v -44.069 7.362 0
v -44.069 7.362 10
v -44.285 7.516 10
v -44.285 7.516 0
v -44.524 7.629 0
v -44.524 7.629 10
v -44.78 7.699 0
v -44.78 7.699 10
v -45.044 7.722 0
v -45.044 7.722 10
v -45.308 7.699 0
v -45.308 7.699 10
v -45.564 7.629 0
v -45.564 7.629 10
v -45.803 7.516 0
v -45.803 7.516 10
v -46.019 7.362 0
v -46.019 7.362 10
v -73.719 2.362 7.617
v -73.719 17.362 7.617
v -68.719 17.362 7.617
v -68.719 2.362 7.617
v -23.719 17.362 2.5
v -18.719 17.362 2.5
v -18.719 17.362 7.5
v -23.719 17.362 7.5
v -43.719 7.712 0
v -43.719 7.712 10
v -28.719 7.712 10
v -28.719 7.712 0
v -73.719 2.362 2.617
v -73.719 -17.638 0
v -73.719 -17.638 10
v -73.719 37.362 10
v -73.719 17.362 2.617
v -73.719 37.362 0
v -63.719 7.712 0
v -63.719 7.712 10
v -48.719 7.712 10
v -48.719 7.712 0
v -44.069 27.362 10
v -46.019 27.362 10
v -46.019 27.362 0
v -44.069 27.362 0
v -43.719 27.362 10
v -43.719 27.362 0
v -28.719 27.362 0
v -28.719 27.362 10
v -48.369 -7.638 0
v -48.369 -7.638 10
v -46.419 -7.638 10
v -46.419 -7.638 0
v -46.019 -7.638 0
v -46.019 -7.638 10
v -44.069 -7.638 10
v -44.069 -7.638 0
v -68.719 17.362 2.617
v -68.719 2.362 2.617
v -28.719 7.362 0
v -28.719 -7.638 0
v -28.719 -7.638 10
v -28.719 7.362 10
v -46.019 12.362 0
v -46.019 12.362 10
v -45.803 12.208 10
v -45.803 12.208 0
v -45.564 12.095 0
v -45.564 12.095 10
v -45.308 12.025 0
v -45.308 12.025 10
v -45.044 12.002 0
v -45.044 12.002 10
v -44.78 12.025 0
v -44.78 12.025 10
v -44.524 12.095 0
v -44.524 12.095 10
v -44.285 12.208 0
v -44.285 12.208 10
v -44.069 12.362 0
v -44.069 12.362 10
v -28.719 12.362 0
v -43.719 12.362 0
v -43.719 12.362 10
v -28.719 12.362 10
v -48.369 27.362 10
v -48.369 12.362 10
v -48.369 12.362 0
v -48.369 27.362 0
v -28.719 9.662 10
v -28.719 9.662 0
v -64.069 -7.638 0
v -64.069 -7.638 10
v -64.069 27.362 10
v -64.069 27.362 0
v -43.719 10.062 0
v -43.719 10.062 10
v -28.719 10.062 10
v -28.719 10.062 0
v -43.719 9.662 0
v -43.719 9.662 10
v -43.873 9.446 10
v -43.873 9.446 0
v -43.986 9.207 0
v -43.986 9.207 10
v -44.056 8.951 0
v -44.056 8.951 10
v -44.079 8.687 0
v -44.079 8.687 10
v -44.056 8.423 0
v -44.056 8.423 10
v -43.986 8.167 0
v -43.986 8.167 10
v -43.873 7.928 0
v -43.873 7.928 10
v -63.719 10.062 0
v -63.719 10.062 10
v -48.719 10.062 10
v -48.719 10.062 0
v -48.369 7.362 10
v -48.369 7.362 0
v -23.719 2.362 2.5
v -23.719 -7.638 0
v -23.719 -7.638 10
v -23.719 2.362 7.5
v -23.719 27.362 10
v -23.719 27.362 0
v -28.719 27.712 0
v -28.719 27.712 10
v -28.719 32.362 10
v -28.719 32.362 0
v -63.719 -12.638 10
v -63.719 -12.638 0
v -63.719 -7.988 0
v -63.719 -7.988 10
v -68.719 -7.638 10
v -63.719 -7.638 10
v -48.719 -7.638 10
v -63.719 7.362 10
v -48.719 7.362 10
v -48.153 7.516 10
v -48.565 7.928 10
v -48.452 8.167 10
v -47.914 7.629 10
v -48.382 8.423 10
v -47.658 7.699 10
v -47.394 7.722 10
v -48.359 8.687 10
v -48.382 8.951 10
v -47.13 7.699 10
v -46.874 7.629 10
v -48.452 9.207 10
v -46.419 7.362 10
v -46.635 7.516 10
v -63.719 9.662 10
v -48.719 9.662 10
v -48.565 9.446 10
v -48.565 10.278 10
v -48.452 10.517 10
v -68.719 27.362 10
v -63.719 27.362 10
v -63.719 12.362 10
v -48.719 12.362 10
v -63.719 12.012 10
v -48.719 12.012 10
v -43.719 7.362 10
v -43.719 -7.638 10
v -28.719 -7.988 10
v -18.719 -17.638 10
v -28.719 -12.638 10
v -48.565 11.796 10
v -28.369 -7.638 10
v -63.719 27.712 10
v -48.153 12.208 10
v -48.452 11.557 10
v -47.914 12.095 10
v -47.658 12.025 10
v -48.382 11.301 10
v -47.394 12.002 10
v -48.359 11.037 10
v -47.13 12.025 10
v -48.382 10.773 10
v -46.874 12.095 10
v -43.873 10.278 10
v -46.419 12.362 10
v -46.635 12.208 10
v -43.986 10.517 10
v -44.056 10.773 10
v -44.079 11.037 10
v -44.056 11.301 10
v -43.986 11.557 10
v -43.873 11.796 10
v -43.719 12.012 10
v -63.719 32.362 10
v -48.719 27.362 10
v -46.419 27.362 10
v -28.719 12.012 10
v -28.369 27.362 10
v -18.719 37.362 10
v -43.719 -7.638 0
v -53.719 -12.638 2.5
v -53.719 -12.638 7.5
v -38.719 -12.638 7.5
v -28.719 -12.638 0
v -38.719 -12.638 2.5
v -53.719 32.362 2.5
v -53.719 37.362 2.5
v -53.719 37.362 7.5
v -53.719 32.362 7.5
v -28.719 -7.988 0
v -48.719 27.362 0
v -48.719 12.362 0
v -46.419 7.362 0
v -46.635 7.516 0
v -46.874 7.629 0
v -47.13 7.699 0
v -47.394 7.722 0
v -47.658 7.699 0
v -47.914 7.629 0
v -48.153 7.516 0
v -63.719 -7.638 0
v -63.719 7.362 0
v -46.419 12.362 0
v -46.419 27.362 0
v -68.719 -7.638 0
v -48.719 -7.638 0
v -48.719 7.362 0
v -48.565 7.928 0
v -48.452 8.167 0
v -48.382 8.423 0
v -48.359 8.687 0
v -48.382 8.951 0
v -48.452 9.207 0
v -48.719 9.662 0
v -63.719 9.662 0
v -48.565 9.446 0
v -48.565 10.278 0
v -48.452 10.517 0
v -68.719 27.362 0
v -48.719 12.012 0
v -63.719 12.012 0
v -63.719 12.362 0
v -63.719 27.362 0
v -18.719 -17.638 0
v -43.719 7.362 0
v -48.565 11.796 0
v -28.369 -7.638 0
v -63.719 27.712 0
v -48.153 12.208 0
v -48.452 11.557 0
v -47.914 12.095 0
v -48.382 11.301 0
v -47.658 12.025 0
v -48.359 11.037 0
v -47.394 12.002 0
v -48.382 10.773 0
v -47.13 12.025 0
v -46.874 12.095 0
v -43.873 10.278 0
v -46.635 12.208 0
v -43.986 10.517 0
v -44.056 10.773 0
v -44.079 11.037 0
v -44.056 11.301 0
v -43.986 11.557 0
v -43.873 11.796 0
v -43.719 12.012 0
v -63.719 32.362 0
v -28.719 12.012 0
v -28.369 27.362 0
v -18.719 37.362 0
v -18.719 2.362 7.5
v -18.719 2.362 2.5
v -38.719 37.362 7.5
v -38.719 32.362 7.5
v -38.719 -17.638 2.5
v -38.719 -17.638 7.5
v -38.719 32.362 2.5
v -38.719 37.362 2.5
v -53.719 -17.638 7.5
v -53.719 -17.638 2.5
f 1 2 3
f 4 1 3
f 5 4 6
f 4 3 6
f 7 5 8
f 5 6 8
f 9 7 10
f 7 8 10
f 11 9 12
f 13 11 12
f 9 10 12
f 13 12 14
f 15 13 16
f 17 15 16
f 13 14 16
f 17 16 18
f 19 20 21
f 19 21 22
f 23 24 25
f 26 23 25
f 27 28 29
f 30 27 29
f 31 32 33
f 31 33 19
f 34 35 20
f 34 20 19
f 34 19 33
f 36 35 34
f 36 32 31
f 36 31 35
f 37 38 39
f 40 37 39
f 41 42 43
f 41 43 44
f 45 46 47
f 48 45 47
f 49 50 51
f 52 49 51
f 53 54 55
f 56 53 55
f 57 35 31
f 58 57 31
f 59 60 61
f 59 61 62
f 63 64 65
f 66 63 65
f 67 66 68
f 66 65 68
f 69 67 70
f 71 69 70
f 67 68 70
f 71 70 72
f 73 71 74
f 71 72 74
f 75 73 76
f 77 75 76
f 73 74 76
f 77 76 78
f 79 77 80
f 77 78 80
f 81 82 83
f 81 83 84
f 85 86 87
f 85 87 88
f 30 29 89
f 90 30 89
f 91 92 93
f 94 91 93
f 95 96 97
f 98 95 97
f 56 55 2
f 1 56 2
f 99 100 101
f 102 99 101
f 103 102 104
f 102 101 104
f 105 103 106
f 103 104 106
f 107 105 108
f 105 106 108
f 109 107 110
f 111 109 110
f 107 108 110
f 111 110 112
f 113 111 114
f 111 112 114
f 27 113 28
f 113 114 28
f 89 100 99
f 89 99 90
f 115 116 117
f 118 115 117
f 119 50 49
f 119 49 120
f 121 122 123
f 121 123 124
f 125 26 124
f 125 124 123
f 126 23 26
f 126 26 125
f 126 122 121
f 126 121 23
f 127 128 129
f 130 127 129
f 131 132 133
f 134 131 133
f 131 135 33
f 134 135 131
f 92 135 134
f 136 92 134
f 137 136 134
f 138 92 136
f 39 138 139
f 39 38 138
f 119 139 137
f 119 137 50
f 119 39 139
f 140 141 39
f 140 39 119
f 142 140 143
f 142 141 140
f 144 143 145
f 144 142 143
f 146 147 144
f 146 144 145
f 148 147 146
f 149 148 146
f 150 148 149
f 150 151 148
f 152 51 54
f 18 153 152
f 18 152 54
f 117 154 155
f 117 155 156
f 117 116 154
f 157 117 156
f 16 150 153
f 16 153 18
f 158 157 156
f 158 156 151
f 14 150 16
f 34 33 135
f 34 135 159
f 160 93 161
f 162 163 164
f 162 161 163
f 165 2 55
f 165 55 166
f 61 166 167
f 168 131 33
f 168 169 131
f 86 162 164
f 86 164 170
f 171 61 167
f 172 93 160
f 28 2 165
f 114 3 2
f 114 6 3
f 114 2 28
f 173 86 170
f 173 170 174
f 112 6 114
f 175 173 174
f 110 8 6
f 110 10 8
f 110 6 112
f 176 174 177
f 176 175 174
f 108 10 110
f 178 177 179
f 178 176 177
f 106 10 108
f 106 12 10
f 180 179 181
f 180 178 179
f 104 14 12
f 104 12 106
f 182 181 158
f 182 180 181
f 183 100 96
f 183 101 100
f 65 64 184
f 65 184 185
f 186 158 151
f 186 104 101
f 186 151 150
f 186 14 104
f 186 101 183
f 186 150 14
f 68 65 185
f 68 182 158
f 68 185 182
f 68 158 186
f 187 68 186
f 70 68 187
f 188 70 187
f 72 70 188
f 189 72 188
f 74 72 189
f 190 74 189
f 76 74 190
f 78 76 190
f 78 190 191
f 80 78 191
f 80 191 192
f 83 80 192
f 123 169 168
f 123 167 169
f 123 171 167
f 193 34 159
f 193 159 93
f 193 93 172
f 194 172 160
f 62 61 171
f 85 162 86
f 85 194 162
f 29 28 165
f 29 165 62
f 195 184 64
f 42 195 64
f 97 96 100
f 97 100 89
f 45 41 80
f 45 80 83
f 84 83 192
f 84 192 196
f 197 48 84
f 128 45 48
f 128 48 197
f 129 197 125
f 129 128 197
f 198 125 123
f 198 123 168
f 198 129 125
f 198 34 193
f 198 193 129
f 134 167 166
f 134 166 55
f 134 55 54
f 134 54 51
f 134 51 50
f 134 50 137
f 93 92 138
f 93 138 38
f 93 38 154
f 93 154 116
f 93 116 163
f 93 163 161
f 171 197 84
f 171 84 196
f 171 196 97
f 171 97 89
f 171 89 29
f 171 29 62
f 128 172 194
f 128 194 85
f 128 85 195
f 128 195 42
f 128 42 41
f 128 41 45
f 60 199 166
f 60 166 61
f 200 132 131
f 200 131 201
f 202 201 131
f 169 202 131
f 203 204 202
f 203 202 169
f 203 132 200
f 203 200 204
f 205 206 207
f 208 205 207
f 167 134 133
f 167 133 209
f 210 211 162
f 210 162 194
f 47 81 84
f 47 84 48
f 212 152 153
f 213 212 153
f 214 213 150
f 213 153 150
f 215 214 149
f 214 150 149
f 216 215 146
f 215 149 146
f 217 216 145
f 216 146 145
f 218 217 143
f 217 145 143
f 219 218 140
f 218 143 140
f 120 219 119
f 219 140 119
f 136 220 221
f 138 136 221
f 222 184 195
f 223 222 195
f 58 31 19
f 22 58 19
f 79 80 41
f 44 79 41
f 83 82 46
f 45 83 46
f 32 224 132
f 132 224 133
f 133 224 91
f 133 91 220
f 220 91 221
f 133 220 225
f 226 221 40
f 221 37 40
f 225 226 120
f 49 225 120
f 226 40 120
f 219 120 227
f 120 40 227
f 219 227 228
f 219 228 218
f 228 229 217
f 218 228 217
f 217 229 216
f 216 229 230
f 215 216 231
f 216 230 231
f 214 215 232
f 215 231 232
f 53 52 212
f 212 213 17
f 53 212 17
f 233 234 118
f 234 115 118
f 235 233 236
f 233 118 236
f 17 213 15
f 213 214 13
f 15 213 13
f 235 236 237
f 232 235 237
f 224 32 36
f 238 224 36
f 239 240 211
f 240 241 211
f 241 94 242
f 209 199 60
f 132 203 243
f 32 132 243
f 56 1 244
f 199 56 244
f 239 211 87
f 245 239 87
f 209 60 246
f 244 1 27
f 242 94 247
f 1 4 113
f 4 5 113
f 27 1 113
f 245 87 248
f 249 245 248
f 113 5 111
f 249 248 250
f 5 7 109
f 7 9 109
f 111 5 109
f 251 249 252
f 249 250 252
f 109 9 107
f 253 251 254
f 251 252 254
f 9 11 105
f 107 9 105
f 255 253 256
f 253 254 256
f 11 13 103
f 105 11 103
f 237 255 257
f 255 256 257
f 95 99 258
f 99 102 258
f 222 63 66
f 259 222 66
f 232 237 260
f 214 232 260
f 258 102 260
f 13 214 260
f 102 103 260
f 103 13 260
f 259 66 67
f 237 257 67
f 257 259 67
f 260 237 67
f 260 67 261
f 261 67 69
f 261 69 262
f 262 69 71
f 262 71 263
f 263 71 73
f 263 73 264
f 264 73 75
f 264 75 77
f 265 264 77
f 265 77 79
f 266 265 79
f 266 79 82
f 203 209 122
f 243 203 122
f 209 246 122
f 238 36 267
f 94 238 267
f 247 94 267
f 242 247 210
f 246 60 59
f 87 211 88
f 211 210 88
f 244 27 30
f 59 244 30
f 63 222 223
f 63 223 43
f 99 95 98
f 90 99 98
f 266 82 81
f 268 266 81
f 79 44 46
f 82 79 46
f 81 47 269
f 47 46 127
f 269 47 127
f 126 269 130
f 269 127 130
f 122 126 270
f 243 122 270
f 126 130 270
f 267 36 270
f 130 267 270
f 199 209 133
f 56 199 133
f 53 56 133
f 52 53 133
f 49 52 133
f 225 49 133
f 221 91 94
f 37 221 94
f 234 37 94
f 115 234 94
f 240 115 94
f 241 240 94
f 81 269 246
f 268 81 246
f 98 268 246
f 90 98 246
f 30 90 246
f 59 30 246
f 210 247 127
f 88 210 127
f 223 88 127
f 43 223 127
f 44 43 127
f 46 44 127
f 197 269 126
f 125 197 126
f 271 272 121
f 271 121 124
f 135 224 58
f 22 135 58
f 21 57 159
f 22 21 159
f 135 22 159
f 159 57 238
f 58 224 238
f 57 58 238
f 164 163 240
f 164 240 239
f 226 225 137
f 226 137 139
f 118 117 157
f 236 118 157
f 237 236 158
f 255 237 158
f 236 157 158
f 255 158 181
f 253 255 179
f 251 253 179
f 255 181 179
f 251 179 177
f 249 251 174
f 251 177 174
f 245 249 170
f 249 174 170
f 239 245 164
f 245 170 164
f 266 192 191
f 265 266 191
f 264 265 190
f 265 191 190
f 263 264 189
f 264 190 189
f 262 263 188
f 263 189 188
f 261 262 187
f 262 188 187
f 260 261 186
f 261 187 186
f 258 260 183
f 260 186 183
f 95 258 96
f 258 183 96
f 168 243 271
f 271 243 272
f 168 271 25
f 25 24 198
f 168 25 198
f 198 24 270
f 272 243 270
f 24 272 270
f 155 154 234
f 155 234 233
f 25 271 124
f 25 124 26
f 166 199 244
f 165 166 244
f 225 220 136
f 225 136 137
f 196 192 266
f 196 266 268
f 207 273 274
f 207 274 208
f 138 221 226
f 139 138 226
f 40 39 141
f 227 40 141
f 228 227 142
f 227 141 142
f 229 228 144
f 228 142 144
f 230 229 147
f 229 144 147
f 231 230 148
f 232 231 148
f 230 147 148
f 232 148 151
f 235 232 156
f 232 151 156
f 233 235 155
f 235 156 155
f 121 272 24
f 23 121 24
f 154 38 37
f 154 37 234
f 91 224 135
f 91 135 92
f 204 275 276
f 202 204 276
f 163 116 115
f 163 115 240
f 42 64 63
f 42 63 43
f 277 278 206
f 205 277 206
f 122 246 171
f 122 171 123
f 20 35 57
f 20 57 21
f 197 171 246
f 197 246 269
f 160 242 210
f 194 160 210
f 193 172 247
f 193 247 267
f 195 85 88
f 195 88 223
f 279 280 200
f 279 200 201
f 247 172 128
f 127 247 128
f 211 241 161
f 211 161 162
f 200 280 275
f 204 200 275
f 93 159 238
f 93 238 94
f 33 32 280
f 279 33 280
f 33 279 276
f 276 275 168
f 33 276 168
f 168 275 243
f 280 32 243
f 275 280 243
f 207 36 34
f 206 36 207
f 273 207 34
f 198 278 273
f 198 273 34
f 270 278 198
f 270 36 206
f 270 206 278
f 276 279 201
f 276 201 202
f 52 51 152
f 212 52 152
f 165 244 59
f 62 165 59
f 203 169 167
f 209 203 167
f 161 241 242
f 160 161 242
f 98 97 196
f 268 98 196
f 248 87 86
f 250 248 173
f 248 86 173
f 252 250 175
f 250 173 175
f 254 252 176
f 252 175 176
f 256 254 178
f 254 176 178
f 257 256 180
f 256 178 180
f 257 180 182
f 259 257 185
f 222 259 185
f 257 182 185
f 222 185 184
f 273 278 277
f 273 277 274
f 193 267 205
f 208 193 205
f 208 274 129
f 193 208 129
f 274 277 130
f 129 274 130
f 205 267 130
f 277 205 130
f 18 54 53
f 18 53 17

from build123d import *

# Parameters (mm, degrees)
F0_W      = 55
F0_H      = 55
F2_DEPTH  = 10
F1_W      = 35
F1_H      = 4
F1_W_2    = 4
F1_H_2    = 35
F1_W_3    = 15
F1_H_3    = 15
F3_DEPTH  = 25
F4_W      = 1.95
F4_H      = 15
F5_DEPTH  = 25
F6_W      = 1.95
F6_H      = 15
F7_DEPTH  = 25
F8_W      = 15
F8_H      = 1.95
F8_W_2    = 1.95
F8_H_2    = 15
F9_DEPTH  = 25
F10_W     = 35
F10_H     = 4.65
F10_W_2   = 4.65
F10_H_2   = 35
F11_DEPTH = 25
F13_DEPTH = 25
F14_W     = 15.000002
F14_H     = 5
F15_DEPTH = 6
F16_W     = 15
F16_H     = 5
F17_DEPTH = 6
F18_W     = 15
F18_H     = 5
F19_DEPTH = 6
F20_W     = 15
F20_H     = 5
F21_DEPTH = 6


with BuildPart() as f2:
    # F0 (on Top) → F2 (new body)
    with BuildSketch(Plane.XY):
        with Locations((-46.218942, 9.861976)):
            Rectangle(F0_W, F0_H)
    extrude(amount=F2_DEPTH)

    # F1 (on face) → F3 (cut)
    with BuildSketch(Plane.XY):
        with Locations((-46.218942, 30.361976)):
            Rectangle(F1_W, F1_H)
        with Locations((-66.718942, 9.861976)):
            Rectangle(F1_W_2, F1_H_2)
        with Locations((-25.718942, 9.861976)):
            Rectangle(F1_W_2, F1_H_2)
        with Locations((-46.218942, -10.638024)):
            Rectangle(F1_W, F1_H)
        with Locations((-56.218942, 19.861976)):
            Rectangle(F1_W_3, F1_H_3)
        with Locations((-36.218942, 19.861976)):
            Rectangle(F1_W_3, F1_H_3)
        with Locations((-56.218942, -0.138024)):
            Rectangle(F1_W_3, F1_H_3)
        with Locations((-36.218942, -0.138024)):
            Rectangle(F1_W_3, F1_H_3)
    extrude(amount=F3_DEPTH, mode=Mode.SUBTRACT)

    # F4 (on face) → F5 (cut)
    with BuildSketch(Plane.XY.offset(10)):
        with Locations((-47.393942, 19.861976)):
            Rectangle(F4_W, F4_H)
    extrude(amount=-F5_DEPTH, mode=Mode.SUBTRACT)

    # F6 (on face) → F7 (cut)
    with BuildSketch(Plane.XY.offset(10)):
        with Locations((-45.043942, 19.861976)):
            Rectangle(F6_W, F6_H)
    extrude(amount=-F7_DEPTH, mode=Mode.SUBTRACT)

    # F8 (on face) → F9 (cut)
    with BuildSketch(Plane.XY.offset(10)):
        with Locations((-56.218942, 11.036976)):
            Rectangle(F8_W, F8_H)
        with Locations((-56.218942, 8.686976)):
            Rectangle(F8_W, F8_H)
        with Locations((-36.218942, 11.036976)):
            Rectangle(F8_W, F8_H)
        with Locations((-36.218942, 8.686976)):
            Rectangle(F8_W, F8_H)
        with Locations((-47.393942, -0.138024)):
            Rectangle(F8_W_2, F8_H_2)
        with Locations((-45.043942, -0.138024)):
            Rectangle(F8_W_2, F8_H_2)
    extrude(amount=-F9_DEPTH, mode=Mode.SUBTRACT)

    # F10 (on face) → F11 (cut)
    with BuildSketch(Plane.XY.offset(10)):
        with Locations((-46.218942, 30.036976)):
            Rectangle(F10_W, F10_H)
        with Locations((-26.043942, 9.861976)):
            Rectangle(F10_W_2, F10_H_2)
        with Locations((-46.218942, -10.313024)):
            Rectangle(F10_W, F10_H)
        with Locations((-66.393942, 9.861976)):
            Rectangle(F10_W_2, F10_H_2)
    extrude(amount=-F11_DEPTH, mode=Mode.SUBTRACT)

    # F12 (on face) → F13 (cut)
    with BuildSketch(Plane.XY.offset(10)):
        with BuildLine():
            Line((-46.418942, 12.361976), (-48.368942, 12.361976))
            ThreePointArc((-48.368942, 12.361976), (-47.393942, 12.001878), (-46.418942, 12.361976))
        make_face()
        with BuildLine():
            Line((-44.068942, 12.361976), (-46.018942, 12.361976))
            ThreePointArc((-46.018942, 12.361976), (-45.043942, 12.001878), (-44.068942, 12.361976))
        make_face()
        with BuildLine():
            Line((-43.718942, 10.061976), (-43.718942, 12.011976))
            ThreePointArc((-43.718942, 12.011976), (-44.079041, 11.036976), (-43.718942, 10.061976))
        make_face()
        with BuildLine():
            Line((-43.718942, 7.711976), (-43.718942, 9.661976))
            ThreePointArc((-43.718942, 9.661976), (-44.079041, 8.686976), (-43.718942, 7.711976))
        make_face()
        with BuildLine():
            Line((-46.018942, 7.361976), (-44.068942, 7.361976))
            ThreePointArc((-44.068942, 7.361976), (-45.043942, 7.722075), (-46.018942, 7.361976))
        make_face()
        with BuildLine():
            Line((-48.368942, 7.361976), (-46.418942, 7.361976))
            ThreePointArc((-46.418942, 7.361976), (-47.393942, 7.722075), (-48.368942, 7.361976))
        make_face()
        with BuildLine():
            Line((-48.718942, 9.661976), (-48.718942, 7.711976))
            ThreePointArc((-48.718942, 7.711976), (-48.358843, 8.686976), (-48.718942, 9.661976))
        make_face()
        with BuildLine():
            Line((-48.718942, 12.011976), (-48.718942, 10.061976))
            ThreePointArc((-48.718942, 10.061976), (-48.358843, 11.036976), (-48.718942, 12.011976))
        make_face()
    extrude(amount=-F13_DEPTH, mode=Mode.SUBTRACT)

    # F14 (on face) → F15 (cut)
    with BuildSketch(Plane.XZ.offset(17.638024)):
        with Locations((-46.218943, 5)):
            Rectangle(F14_W, F14_H)
    extrude(amount=-F15_DEPTH, mode=Mode.SUBTRACT)

    # F16 (on face) → F17 (cut)
    with BuildSketch(Plane.YZ.offset(-18.718942)):
        with Locations((9.861976, 5)):
            Rectangle(F16_W, F16_H)
    extrude(amount=-F17_DEPTH, mode=Mode.SUBTRACT)

    # F18 (on face) → F19 (cut)
    with BuildSketch(Plane(origin=(0, 37.361976, 0), x_dir=(-1, 0, 0), z_dir=(0, 1, 0))):
        with Locations((46.218942, 5)):
            Rectangle(F18_W, F18_H)
    extrude(amount=-F19_DEPTH, mode=Mode.SUBTRACT)

    # F20 (on face) → F21 (cut)
    with BuildSketch(Plane(origin=(-73.718942, 0, 0), x_dir=(0, -1, 0), z_dir=(-1, 0, 0))):
        with Locations((-9.861976, 5.117217)):
            Rectangle(F20_W, F20_H)
    extrude(amount=-F21_DEPTH, mode=Mode.SUBTRACT)


solid = f2.part
